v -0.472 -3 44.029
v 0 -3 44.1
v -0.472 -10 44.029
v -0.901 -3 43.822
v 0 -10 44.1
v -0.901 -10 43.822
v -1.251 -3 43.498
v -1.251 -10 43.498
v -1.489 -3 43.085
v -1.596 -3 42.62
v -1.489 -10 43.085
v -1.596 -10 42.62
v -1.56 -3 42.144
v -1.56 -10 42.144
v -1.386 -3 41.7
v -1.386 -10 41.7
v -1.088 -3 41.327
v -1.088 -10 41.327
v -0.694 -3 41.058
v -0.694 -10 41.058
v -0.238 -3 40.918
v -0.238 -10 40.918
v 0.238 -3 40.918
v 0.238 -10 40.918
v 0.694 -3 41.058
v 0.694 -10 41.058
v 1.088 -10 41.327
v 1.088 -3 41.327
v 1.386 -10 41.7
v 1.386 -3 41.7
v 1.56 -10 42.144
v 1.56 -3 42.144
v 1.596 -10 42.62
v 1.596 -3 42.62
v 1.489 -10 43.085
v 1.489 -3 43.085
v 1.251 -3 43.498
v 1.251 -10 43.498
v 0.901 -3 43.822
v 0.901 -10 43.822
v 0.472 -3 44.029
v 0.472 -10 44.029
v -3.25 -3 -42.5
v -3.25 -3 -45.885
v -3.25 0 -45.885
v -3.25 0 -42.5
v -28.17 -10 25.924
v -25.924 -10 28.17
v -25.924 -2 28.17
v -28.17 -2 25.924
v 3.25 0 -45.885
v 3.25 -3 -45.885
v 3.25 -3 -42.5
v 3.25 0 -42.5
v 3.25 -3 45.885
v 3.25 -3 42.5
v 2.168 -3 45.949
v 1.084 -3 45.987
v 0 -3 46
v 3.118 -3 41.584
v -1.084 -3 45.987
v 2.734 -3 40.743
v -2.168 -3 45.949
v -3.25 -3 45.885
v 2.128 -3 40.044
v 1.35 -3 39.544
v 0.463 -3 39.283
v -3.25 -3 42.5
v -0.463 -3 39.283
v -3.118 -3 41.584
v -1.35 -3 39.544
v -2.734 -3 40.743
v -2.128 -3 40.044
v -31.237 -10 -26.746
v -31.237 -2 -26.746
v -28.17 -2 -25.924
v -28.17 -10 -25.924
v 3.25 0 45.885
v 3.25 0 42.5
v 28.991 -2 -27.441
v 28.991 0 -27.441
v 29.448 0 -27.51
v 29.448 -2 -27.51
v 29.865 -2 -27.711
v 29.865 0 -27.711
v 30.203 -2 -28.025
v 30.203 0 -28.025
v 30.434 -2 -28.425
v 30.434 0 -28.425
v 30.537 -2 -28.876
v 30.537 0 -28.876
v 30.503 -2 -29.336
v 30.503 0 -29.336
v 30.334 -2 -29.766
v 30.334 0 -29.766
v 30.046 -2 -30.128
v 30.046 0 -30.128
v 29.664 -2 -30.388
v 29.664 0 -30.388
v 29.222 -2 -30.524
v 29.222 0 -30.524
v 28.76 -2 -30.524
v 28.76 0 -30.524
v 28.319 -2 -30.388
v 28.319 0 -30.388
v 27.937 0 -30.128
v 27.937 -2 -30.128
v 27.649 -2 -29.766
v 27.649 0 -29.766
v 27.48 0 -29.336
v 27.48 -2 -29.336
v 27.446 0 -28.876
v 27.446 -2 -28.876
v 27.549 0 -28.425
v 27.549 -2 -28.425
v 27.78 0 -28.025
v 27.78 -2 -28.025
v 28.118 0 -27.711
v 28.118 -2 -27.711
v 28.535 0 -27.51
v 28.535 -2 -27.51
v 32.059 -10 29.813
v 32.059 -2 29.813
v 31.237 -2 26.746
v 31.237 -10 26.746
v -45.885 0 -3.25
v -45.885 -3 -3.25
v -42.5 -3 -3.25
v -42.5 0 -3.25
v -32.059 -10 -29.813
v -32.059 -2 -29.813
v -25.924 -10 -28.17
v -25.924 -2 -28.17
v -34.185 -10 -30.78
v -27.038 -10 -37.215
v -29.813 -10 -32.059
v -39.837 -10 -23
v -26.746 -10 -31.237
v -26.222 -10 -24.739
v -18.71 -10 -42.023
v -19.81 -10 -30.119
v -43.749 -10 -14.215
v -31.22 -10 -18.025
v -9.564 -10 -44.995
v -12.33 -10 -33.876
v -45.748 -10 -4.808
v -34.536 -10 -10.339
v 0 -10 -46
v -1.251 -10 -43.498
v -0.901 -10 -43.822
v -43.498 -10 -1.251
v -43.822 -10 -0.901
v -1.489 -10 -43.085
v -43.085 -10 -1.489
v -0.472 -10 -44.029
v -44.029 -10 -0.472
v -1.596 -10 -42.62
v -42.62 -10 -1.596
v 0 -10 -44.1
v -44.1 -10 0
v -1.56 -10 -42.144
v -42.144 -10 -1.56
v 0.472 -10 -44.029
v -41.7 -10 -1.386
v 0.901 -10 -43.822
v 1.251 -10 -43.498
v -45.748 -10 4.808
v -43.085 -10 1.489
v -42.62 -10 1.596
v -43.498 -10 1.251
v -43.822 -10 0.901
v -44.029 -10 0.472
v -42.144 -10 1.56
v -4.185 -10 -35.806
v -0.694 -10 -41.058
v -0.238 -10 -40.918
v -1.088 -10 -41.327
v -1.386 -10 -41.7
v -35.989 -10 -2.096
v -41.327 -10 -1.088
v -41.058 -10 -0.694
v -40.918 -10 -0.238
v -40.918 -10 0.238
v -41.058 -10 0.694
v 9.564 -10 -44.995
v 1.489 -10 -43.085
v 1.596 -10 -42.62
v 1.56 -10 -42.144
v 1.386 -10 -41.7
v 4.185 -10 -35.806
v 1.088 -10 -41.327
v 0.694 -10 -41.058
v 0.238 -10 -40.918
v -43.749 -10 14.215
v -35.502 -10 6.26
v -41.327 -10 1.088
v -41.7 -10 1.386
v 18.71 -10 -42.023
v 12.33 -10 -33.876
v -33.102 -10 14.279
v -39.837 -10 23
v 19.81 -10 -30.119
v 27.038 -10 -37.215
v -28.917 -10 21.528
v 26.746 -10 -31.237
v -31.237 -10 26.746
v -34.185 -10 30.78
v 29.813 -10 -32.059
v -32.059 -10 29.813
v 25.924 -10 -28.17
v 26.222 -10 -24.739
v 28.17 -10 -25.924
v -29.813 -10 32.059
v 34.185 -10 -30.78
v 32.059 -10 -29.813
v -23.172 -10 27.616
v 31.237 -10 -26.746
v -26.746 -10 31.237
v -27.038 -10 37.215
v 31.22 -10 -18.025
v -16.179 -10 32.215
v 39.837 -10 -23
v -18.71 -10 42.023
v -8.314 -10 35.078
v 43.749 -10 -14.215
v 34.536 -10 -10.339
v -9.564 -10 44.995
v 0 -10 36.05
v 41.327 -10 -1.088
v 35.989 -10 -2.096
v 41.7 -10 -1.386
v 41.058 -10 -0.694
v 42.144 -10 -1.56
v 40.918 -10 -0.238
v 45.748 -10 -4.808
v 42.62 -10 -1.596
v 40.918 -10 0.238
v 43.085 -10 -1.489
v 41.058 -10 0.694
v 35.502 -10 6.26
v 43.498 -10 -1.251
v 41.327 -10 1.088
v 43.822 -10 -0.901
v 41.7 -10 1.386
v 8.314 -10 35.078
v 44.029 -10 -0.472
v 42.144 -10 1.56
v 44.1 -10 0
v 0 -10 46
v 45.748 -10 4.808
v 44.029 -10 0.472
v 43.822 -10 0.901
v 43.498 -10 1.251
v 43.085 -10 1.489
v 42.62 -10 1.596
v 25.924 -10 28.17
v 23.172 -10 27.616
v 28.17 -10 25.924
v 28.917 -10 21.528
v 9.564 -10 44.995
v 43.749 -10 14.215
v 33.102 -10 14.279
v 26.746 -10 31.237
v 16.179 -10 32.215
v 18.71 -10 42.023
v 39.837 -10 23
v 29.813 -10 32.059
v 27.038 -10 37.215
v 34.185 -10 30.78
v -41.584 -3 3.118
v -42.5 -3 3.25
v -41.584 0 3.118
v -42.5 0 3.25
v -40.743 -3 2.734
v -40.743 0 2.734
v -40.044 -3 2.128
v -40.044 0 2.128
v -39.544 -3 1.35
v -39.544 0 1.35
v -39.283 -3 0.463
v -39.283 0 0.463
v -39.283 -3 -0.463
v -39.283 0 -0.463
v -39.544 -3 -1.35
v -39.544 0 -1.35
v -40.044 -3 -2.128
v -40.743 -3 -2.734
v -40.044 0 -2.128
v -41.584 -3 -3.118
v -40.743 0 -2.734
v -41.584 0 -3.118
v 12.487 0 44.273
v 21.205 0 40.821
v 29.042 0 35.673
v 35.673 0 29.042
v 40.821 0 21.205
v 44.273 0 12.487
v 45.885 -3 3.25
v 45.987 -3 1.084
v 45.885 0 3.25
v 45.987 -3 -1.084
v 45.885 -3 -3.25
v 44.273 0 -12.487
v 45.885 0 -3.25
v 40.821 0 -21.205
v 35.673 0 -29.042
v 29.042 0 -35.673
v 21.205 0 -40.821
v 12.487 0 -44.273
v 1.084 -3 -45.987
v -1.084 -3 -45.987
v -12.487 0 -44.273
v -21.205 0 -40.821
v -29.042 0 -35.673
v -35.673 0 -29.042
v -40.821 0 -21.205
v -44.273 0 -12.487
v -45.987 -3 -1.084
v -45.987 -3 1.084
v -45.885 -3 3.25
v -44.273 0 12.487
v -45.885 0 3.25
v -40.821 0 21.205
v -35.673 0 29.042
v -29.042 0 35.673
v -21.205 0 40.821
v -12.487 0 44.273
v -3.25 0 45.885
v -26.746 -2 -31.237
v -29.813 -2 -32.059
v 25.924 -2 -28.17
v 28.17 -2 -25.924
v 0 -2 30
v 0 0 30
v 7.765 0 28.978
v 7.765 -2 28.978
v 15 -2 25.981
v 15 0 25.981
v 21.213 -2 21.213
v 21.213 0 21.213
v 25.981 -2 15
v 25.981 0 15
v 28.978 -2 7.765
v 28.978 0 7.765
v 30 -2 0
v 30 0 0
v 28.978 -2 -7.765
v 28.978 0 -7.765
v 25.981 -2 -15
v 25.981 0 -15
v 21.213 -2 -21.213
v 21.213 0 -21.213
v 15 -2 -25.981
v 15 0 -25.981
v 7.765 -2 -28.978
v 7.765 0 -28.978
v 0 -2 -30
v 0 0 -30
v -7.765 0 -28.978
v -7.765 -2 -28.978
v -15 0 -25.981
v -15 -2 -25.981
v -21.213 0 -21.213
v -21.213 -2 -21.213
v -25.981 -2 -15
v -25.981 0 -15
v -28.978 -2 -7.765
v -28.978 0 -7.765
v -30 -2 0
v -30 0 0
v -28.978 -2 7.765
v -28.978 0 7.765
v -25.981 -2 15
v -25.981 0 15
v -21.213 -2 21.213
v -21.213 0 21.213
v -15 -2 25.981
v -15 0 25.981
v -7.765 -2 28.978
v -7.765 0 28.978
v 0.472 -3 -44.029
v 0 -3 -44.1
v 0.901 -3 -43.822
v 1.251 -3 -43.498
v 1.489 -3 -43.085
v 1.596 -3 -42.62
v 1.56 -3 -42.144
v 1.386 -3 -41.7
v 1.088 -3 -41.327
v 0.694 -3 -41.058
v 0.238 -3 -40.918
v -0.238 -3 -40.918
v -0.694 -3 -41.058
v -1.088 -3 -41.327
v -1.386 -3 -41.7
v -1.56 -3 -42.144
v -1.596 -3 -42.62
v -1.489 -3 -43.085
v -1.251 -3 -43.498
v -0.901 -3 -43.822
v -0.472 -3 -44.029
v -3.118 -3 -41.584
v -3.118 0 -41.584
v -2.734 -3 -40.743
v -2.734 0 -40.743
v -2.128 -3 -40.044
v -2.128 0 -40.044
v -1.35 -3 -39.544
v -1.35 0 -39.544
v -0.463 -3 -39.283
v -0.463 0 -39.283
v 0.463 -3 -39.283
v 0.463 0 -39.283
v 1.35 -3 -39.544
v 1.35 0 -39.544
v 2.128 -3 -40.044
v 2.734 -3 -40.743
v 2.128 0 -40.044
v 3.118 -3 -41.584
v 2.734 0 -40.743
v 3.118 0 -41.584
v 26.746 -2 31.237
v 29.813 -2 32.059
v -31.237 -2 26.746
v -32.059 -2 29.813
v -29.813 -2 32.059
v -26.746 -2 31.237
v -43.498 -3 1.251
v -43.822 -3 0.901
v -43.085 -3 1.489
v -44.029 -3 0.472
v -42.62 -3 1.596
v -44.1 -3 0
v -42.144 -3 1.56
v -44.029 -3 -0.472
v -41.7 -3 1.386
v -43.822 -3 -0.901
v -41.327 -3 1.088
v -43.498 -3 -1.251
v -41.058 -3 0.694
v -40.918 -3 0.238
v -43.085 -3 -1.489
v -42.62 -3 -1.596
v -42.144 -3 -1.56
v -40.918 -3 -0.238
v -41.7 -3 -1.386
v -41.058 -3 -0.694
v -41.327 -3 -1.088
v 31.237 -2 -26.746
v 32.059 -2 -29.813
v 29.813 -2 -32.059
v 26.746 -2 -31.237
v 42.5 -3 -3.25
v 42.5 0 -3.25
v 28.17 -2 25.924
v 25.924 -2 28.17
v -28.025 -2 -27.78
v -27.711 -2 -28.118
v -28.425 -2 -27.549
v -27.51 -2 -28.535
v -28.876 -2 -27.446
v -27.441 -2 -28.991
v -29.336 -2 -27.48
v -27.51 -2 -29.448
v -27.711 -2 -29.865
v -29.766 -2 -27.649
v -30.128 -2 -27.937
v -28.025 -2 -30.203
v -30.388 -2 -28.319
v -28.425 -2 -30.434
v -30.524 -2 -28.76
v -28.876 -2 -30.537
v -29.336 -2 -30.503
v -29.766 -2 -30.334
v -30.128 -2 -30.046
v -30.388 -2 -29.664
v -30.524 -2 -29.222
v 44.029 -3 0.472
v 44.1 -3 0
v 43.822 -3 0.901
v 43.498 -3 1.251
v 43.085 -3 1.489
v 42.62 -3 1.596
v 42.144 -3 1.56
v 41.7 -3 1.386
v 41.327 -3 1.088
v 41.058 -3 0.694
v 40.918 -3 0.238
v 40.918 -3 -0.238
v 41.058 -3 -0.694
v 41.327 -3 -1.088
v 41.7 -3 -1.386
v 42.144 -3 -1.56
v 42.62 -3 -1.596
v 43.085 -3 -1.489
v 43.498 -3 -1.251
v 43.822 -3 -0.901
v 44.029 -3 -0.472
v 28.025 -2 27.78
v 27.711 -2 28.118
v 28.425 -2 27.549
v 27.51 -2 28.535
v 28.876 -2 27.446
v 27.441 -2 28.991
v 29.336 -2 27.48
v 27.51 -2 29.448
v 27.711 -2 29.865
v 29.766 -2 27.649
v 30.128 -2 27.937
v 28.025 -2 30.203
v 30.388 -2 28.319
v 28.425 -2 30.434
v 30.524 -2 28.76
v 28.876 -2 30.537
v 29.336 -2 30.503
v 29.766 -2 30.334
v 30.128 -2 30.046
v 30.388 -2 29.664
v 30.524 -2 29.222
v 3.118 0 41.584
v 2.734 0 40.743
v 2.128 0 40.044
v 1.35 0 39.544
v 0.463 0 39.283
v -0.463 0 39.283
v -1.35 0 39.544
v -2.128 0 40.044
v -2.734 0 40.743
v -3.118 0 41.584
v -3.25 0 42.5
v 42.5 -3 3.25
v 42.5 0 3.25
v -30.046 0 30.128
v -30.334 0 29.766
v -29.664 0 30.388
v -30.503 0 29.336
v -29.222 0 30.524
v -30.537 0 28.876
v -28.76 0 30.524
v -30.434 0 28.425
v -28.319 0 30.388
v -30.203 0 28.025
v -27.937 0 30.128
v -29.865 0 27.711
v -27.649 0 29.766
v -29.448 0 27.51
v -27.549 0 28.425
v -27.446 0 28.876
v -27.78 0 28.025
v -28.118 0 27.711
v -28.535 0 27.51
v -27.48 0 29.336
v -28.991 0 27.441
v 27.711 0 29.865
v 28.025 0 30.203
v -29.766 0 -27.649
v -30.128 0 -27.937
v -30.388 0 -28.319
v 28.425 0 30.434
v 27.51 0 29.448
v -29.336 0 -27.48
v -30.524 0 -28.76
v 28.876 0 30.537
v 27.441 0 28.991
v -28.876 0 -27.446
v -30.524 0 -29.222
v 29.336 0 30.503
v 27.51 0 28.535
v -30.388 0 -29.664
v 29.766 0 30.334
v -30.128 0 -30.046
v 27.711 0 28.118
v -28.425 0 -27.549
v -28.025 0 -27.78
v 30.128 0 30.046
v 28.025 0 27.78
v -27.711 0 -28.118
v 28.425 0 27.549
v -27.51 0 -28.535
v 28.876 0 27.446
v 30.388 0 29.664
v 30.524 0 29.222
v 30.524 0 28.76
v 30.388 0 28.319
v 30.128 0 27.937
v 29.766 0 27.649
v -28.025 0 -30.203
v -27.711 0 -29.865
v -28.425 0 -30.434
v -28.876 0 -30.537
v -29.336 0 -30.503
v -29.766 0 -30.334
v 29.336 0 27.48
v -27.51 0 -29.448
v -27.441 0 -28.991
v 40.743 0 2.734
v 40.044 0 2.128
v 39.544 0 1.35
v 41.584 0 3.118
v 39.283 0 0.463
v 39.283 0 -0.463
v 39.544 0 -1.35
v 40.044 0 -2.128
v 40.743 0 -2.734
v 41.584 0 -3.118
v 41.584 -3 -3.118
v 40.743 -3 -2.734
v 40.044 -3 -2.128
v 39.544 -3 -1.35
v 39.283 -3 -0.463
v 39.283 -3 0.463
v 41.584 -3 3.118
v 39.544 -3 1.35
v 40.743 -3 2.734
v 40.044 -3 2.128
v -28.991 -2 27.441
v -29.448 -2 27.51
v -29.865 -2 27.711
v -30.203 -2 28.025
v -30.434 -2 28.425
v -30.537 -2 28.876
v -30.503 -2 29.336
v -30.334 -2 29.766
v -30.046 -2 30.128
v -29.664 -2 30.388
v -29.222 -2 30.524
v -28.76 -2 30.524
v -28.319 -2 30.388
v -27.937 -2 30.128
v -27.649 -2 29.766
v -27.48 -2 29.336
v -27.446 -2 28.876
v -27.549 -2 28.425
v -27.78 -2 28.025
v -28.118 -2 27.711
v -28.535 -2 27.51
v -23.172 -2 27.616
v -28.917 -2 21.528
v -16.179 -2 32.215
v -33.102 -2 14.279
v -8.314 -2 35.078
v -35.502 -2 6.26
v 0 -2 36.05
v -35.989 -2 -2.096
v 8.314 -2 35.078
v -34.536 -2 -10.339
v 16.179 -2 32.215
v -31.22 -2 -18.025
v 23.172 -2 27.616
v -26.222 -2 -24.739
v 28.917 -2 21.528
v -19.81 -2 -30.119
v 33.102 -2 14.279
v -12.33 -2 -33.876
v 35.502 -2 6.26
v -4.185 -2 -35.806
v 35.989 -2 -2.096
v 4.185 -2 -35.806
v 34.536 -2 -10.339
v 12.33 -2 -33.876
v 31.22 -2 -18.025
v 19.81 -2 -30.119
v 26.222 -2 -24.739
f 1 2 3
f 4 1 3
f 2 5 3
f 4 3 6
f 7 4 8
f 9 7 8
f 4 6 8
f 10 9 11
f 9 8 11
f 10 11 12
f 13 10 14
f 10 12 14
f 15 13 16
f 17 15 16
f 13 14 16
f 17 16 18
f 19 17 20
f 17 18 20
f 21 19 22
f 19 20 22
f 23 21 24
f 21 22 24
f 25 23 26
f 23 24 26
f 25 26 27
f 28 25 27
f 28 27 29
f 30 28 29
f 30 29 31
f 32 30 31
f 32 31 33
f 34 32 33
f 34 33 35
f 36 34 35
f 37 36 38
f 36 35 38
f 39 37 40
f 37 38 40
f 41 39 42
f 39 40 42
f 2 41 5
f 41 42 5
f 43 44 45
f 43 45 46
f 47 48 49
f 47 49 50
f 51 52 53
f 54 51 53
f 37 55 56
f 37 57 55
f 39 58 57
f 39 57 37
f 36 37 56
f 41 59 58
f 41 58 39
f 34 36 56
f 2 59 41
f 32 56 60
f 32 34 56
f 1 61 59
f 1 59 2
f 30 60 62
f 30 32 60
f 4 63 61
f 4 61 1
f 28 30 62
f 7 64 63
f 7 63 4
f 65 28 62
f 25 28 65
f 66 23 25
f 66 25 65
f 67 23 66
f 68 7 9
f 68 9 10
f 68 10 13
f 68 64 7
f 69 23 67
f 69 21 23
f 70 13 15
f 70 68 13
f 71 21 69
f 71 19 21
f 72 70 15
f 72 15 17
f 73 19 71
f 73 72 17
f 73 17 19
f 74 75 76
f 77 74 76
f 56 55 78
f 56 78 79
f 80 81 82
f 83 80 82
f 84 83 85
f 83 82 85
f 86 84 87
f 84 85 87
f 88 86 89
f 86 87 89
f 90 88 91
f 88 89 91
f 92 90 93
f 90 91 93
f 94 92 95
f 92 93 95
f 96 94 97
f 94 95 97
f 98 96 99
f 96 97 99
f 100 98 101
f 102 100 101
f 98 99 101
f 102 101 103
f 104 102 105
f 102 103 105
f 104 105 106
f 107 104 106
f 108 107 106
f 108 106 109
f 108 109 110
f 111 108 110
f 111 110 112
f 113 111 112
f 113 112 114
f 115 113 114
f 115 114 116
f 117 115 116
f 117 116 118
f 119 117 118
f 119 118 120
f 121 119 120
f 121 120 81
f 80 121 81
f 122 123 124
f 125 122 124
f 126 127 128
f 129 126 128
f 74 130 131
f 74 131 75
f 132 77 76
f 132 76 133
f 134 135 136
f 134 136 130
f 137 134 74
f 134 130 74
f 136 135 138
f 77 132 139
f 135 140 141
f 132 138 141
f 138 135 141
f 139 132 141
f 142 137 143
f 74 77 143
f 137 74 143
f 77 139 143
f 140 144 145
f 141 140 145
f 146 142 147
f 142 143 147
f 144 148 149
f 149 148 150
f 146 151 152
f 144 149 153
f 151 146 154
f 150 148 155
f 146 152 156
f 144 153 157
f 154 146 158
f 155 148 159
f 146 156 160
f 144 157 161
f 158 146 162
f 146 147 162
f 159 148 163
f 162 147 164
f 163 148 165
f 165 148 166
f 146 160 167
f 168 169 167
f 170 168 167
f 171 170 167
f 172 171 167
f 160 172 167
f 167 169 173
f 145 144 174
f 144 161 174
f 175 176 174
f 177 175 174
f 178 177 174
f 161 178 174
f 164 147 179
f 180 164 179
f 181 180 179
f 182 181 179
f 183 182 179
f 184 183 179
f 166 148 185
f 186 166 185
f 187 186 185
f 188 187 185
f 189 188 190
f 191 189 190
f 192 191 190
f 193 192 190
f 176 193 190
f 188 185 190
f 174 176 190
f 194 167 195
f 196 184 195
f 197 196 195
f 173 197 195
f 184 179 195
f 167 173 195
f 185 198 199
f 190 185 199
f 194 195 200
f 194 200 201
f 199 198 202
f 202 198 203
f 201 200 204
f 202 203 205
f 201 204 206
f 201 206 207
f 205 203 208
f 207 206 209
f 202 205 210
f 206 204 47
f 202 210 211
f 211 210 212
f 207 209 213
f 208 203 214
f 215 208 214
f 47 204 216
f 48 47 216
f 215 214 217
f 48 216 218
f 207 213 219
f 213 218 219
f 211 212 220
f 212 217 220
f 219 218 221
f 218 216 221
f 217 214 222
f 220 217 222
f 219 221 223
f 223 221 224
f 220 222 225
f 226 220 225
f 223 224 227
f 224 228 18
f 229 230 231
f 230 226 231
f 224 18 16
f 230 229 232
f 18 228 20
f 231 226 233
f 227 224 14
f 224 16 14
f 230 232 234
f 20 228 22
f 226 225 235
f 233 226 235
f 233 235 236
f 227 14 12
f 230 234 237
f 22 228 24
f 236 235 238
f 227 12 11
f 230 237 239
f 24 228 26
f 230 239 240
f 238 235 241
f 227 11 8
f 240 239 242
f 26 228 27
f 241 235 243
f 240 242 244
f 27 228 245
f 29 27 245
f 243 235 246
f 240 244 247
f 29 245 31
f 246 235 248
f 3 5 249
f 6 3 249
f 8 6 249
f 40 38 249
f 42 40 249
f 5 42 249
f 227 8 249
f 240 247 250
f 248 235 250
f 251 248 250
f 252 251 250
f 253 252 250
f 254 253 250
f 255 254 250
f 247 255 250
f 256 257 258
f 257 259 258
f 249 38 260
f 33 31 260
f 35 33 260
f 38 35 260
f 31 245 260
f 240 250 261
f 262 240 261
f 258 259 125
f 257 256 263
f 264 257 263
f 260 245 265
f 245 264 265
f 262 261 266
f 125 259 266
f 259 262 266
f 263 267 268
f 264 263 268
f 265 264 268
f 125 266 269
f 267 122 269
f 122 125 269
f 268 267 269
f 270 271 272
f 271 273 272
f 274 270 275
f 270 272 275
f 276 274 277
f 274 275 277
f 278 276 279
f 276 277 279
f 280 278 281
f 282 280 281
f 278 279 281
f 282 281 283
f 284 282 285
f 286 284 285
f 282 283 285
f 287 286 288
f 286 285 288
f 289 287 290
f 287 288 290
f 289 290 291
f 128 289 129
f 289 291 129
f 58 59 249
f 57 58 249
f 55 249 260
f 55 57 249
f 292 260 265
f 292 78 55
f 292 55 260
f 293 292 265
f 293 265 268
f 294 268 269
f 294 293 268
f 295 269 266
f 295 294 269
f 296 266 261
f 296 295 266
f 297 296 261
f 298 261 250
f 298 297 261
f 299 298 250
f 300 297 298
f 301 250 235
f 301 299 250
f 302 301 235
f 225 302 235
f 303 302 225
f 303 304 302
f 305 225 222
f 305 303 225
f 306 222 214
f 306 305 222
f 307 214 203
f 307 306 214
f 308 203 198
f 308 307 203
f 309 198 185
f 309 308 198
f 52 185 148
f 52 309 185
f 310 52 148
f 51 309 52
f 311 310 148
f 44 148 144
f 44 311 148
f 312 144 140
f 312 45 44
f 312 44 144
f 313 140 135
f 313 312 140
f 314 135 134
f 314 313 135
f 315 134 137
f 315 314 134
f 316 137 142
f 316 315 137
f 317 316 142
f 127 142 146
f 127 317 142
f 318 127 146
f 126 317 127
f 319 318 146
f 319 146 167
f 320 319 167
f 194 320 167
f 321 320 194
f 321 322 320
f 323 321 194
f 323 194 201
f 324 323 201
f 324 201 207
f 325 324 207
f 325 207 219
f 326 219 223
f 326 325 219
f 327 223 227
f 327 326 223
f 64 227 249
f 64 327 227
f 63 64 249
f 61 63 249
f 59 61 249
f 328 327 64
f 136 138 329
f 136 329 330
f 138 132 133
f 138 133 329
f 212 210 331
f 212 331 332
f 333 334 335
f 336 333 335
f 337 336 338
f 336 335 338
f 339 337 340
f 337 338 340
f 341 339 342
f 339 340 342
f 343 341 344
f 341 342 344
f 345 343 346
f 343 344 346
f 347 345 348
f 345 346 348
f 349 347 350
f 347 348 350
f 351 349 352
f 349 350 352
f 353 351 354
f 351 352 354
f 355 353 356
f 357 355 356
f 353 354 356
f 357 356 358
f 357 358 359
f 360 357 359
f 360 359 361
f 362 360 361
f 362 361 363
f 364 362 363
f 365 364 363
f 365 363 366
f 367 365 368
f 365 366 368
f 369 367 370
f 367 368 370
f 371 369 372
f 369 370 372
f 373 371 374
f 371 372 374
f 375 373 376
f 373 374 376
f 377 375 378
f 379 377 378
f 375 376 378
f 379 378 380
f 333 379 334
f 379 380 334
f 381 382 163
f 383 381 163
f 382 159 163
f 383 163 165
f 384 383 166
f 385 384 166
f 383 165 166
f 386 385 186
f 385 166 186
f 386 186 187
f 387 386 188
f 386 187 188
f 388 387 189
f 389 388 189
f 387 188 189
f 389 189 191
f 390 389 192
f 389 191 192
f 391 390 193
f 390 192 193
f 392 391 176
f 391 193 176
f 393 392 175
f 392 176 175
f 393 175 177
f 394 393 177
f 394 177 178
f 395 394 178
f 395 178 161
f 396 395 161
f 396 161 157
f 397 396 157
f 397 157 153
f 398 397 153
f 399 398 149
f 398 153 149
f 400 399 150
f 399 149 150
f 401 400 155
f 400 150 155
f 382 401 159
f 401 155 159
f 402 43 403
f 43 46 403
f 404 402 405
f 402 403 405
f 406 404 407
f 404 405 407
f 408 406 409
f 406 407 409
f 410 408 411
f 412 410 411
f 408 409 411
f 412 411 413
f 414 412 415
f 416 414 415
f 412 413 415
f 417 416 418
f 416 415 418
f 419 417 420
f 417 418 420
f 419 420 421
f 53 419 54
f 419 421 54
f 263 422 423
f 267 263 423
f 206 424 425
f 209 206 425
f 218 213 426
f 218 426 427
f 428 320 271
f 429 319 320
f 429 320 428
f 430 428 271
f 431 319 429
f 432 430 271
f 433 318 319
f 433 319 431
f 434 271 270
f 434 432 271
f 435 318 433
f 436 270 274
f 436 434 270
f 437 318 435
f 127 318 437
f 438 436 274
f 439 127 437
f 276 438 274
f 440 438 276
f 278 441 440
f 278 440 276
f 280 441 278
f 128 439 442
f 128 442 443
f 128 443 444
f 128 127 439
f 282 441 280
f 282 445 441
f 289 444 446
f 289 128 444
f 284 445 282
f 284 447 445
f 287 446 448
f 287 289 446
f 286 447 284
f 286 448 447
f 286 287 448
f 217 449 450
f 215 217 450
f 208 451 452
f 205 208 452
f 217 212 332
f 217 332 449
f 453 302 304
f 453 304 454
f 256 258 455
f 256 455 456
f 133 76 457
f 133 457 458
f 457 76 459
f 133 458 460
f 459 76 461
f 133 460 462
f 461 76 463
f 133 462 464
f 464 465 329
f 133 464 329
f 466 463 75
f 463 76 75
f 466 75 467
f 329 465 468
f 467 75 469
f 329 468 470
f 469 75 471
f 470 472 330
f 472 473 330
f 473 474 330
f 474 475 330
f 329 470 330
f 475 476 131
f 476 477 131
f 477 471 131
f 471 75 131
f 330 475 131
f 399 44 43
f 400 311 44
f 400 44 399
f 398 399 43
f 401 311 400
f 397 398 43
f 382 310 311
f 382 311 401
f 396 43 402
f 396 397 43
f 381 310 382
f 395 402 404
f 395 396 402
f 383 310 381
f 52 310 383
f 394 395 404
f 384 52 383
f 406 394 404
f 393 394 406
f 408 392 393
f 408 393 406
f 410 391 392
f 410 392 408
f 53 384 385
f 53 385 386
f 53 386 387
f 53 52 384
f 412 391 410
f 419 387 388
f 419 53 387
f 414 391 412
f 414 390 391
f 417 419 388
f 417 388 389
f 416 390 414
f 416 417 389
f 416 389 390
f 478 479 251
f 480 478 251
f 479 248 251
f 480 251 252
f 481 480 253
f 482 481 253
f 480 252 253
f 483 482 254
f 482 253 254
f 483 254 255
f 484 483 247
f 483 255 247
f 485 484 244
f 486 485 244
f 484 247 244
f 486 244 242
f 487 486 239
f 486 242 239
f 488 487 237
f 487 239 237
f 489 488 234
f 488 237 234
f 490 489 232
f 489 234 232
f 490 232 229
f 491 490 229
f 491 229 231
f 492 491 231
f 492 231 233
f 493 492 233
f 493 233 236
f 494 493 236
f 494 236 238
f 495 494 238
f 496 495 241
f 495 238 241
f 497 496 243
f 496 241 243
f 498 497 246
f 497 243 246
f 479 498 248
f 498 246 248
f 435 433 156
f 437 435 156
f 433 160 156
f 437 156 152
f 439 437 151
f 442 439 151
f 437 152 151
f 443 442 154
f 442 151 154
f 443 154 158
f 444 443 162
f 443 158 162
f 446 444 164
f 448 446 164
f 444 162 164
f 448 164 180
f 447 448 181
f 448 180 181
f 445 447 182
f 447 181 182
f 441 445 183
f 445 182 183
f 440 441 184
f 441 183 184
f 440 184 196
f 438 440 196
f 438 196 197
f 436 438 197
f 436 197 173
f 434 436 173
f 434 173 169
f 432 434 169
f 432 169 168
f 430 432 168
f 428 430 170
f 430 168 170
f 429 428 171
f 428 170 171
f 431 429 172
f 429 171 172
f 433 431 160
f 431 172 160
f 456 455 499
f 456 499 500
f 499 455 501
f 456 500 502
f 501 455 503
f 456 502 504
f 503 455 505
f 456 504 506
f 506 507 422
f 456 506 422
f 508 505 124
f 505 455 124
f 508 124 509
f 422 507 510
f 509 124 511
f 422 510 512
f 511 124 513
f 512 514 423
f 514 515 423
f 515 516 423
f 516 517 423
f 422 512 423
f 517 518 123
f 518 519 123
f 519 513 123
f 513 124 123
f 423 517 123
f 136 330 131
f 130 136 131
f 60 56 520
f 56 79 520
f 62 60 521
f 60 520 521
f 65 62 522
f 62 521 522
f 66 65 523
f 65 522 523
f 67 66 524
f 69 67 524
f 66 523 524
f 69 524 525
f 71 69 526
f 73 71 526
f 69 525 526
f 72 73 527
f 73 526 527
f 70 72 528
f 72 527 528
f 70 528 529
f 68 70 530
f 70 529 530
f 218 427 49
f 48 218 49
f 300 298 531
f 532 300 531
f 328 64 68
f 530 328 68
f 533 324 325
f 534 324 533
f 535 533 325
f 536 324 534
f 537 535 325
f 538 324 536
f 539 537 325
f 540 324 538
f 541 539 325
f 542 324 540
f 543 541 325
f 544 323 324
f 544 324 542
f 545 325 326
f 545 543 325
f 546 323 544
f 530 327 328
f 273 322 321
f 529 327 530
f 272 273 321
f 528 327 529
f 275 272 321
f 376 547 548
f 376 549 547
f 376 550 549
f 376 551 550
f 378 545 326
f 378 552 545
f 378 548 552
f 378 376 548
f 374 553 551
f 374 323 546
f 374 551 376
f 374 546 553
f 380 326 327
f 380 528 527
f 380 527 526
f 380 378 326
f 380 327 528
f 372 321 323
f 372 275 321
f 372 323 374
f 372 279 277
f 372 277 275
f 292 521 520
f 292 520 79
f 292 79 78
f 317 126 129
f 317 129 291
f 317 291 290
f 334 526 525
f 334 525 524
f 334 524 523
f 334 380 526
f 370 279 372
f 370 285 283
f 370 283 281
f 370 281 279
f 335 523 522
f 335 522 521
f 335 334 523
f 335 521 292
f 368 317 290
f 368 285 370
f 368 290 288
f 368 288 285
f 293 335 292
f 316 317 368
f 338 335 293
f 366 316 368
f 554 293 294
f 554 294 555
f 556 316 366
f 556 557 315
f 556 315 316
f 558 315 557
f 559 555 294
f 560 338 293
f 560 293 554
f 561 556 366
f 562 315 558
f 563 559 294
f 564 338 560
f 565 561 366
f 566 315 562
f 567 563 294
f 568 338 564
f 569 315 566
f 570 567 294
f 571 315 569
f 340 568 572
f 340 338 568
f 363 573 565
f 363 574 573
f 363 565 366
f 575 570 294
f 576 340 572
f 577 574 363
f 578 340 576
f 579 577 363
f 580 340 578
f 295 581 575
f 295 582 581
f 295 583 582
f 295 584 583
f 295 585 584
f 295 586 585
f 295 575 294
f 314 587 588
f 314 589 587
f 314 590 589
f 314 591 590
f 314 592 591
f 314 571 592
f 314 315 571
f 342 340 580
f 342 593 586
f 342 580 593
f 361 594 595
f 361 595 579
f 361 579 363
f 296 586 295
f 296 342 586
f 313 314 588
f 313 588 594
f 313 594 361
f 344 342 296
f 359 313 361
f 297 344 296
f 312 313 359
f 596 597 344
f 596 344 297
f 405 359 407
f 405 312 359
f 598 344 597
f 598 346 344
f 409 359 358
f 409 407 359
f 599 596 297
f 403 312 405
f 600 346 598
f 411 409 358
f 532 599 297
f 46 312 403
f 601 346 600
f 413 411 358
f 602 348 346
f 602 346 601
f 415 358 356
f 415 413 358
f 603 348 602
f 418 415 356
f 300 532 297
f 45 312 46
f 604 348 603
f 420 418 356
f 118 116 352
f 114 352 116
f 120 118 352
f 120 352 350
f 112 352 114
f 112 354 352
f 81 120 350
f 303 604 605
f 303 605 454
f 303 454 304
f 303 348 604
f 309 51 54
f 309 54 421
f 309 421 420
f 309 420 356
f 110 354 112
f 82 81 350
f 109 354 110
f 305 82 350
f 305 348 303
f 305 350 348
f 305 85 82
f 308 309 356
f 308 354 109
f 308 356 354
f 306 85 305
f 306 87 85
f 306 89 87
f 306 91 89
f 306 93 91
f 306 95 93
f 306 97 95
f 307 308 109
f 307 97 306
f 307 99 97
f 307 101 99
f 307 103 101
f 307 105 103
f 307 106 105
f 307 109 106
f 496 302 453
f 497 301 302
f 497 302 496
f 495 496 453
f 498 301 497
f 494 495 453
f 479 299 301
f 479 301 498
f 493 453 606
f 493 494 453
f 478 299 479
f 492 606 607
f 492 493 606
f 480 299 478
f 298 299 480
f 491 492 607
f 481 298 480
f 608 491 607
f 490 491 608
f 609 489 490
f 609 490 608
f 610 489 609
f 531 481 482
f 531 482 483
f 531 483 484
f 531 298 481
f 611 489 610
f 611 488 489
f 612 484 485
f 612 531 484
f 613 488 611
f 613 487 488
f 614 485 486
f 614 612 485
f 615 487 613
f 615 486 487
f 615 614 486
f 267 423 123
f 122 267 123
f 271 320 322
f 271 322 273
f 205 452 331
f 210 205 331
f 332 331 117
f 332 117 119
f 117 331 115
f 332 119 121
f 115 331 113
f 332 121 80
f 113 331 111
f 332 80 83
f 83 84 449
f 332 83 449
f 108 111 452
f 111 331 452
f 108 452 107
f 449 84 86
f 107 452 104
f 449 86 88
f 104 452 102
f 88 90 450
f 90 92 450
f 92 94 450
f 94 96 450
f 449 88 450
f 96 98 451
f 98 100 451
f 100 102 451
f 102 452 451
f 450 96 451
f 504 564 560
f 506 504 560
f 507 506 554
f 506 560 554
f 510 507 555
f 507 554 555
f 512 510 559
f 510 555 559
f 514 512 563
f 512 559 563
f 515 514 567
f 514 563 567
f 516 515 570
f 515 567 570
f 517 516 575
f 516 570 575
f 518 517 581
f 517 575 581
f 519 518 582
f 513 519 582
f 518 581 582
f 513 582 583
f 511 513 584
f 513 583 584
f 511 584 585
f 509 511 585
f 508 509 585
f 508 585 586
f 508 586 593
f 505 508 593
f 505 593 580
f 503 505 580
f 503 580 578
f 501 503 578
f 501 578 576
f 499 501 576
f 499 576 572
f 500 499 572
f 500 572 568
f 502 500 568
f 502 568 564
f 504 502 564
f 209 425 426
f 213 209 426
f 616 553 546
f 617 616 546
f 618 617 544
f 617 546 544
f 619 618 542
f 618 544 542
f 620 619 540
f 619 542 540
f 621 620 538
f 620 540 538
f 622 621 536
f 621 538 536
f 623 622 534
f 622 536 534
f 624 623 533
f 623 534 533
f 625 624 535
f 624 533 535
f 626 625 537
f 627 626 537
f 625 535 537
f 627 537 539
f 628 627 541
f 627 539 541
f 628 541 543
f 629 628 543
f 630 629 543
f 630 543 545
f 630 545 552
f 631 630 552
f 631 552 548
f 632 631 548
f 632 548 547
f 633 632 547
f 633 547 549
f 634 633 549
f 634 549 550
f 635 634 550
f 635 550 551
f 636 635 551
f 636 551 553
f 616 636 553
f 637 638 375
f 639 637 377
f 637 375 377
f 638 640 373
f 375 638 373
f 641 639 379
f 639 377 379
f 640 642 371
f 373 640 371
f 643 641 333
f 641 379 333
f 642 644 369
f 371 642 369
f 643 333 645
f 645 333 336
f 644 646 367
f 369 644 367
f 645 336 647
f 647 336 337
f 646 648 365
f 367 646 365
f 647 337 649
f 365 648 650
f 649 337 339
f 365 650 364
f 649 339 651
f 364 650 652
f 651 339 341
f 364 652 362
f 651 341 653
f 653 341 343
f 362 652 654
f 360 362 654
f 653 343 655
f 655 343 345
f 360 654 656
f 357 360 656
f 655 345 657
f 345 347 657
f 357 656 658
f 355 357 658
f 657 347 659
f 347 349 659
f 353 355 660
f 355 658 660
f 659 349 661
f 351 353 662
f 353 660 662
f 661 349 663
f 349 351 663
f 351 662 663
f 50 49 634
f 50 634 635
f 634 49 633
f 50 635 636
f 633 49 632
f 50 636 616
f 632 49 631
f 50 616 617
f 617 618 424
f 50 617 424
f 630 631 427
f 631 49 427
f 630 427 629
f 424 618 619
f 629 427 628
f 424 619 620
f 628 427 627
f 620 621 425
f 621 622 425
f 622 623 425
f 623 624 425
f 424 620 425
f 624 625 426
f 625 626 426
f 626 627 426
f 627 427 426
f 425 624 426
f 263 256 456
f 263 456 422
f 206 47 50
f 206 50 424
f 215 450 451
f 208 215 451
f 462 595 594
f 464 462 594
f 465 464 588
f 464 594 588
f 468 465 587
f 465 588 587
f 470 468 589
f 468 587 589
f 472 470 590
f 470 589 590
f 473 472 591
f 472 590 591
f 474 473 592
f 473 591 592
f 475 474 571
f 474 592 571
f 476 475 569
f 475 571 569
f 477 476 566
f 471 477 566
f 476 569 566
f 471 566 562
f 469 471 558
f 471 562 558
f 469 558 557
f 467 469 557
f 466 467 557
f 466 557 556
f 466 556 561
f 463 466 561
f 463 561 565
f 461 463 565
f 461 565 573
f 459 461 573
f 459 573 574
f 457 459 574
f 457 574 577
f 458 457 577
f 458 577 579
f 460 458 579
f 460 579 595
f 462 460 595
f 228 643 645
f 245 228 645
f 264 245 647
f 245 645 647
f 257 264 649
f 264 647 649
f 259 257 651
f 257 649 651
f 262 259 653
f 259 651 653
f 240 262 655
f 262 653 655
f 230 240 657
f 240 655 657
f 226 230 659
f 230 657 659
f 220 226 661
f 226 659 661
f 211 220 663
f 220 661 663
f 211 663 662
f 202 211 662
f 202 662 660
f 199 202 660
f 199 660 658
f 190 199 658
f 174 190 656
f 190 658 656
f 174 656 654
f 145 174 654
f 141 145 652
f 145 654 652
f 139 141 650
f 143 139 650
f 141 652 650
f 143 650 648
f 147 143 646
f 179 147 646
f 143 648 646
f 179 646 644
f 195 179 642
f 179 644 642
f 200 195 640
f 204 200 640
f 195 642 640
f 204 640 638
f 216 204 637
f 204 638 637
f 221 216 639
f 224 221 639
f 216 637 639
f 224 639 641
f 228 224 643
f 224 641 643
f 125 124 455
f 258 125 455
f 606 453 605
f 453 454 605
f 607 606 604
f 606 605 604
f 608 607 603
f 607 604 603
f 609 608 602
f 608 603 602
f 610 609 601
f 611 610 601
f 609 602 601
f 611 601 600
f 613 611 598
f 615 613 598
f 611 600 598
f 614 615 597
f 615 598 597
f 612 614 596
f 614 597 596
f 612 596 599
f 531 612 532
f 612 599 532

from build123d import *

# Parameters (mm, degrees)
SKETCH1_R                      = 46
SKETCH1_R_2                    = 36.05
SKETCH1_R_3                    = 30
BOSS_EXTRUDE1_DEPTH            = 2
BOSS_EXTRUDE2_START            = -2
SKETCH1_3_R                    = 46
SKETCH1_3_R_2                  = 36.05
BOSS_EXTRUDE2_DEPTH            = 8
CBORE_FOR_M3_SHCS2_D           = 3.2
CBORE_FOR_M3_SHCS2_CBORE_D     = 6.5
CBORE_FOR_M3_SHCS2_CBORE_DEPTH = 3
SKETCH8_R                      = 3.25
SKETCH8_W                      = 10
SKETCH8_H                      = 6.5
CUT_EXTRUDE1_DEPTH             = 66.429351212
CIRPATTERN1_COUNT              = 4
SKETCH9_R                      = 1.55
CUT_EXTRUDE2_DEPTH             = 66.817930688
CUT_EXTRUDE3_START             = -2
SKETCH9_3_R                    = 1.55
CUT_EXTRUDE3_DEPTH             = 64.817930688
CIRPATTERN2_COUNT              = 4


with BuildPart() as part:
    # Sketch1 → Boss-Extrude1 (new body)
    # profile 1 of 2: a face of its own
    with BuildSketch(Plane(origin=(0, 0, 0), x_dir=(1, 0, 0), z_dir=(0, 1, 0))):
        with Locations(Location((0, 0, 0), (0, 0, 270))):
            Circle(SKETCH1_R)
        Circle(SKETCH1_R_2, mode=Mode.SUBTRACT)
    # profile 2 of 2: a face of its own
    with BuildSketch(Plane(origin=(0, 0, 0), x_dir=(1, 0, 0), z_dir=(0, 1, 0))):
        Circle(SKETCH1_R_2)
        with Locations(Location((0, 0, 0), (0, 0, 270))):
            Circle(SKETCH1_R_3, mode=Mode.SUBTRACT)
    extrude(amount=-BOSS_EXTRUDE1_DEPTH)

    # Sketch1<3> → Boss-Extrude2 (add)
    with BuildSketch(Plane(origin=(0, 0, 0), x_dir=(1, 0, 0), z_dir=(0, 1, 0)).offset(BOSS_EXTRUDE2_START)):
        with Locations(Location((0, 0, 0), (0, 0, 270))):
            Circle(SKETCH1_3_R)
        with Locations(Location((0, 0, 0), (0, 0, 270))):
            Circle(SKETCH1_3_R_2, mode=Mode.SUBTRACT)
    extrude(amount=-BOSS_EXTRUDE2_DEPTH)

    # CBORE for M3 SHCS2 (through all)
    with Locations(Plane(origin=(0, 0, 0), x_dir=(1, 0, 0), z_dir=(0, 1, 0))):
        with Locations((-42.5, 0)):
            cbore_for_m3_shcs2 = CounterBoreHole(CBORE_FOR_M3_SHCS2_D / 2, CBORE_FOR_M3_SHCS2_CBORE_D / 2, CBORE_FOR_M3_SHCS2_CBORE_DEPTH)

    # Sketch8 → Cut-Extrude1 (cut, through all)
    with BuildSketch(Plane(origin=(0, -3, 0), x_dir=(1, 0, 0), z_dir=(0, 1, 0))):
        with Locations((-42.5, 0)):
            Circle(SKETCH8_R)
        with Locations((-47.5, 0)):
            Rectangle(SKETCH8_W, SKETCH8_H)
    cut_extrude1 = extrude(amount=CUT_EXTRUDE1_DEPTH, mode=Mode.SUBTRACT)

    # CirPattern1: CBORE for M3 SHCS2, Cut-Extrude1 ×4 about axis
    cirpattern1_axis = Axis((0, 0, 0), (0, 1, 0))
    add([cbore_for_m3_shcs2.rotate(cirpattern1_axis, i * 360 / CIRPATTERN1_COUNT) for i in range(1, CIRPATTERN1_COUNT)], mode=Mode.SUBTRACT)
    add([cut_extrude1.rotate(cirpattern1_axis, i * 360 / CIRPATTERN1_COUNT) for i in range(1, CIRPATTERN1_COUNT)], mode=Mode.SUBTRACT)

    # Sketch9 → Cut-Extrude2 (cut, through all)
    with BuildSketch(Plane(origin=(0, 0, 0), x_dir=(1, 0, 0), z_dir=(0, 1, 0))):
        with Locations(Location((28.991378029, 28.991378029, 0), (0, 0, 270))):
            Circle(SKETCH9_R)
    cut_extrude2 = extrude(amount=-CUT_EXTRUDE2_DEPTH, mode=Mode.SUBTRACT)

    # Sketch9<3> → Cut-Extrude3 (cut, through all)
    with BuildSketch(Plane(origin=(0, 0, 0), x_dir=(1, 0, 0), z_dir=(0, 1, 0)).offset(CUT_EXTRUDE3_START)):
        Polygon((32.058604476, 29.813238878), (29.813238878, 32.058604476), (26.746012431, 31.236743626), (25.924151582, 28.169517179), (28.169517179, 25.924151582), (31.236743626, 26.746012431), align=None)
        with Locations(Location((28.991378029, 28.991378029, 0), (0, 0, 270))):
            Circle(SKETCH9_3_R, mode=Mode.SUBTRACT)
    cut_extrude3 = extrude(amount=-CUT_EXTRUDE3_DEPTH, mode=Mode.SUBTRACT)

    # CirPattern2: Cut-Extrude2, Cut-Extrude3 ×4 about axis
    cirpattern2_axis = Axis((0, 0, 0), (0, 1, 0))
    add([cut_extrude2.rotate(cirpattern2_axis, i * 360 / CIRPATTERN2_COUNT) for i in range(1, CIRPATTERN2_COUNT)], mode=Mode.SUBTRACT)
    add([cut_extrude3.rotate(cirpattern2_axis, i * 360 / CIRPATTERN2_COUNT) for i in range(1, CIRPATTERN2_COUNT)], mode=Mode.SUBTRACT)


solid = part.part
